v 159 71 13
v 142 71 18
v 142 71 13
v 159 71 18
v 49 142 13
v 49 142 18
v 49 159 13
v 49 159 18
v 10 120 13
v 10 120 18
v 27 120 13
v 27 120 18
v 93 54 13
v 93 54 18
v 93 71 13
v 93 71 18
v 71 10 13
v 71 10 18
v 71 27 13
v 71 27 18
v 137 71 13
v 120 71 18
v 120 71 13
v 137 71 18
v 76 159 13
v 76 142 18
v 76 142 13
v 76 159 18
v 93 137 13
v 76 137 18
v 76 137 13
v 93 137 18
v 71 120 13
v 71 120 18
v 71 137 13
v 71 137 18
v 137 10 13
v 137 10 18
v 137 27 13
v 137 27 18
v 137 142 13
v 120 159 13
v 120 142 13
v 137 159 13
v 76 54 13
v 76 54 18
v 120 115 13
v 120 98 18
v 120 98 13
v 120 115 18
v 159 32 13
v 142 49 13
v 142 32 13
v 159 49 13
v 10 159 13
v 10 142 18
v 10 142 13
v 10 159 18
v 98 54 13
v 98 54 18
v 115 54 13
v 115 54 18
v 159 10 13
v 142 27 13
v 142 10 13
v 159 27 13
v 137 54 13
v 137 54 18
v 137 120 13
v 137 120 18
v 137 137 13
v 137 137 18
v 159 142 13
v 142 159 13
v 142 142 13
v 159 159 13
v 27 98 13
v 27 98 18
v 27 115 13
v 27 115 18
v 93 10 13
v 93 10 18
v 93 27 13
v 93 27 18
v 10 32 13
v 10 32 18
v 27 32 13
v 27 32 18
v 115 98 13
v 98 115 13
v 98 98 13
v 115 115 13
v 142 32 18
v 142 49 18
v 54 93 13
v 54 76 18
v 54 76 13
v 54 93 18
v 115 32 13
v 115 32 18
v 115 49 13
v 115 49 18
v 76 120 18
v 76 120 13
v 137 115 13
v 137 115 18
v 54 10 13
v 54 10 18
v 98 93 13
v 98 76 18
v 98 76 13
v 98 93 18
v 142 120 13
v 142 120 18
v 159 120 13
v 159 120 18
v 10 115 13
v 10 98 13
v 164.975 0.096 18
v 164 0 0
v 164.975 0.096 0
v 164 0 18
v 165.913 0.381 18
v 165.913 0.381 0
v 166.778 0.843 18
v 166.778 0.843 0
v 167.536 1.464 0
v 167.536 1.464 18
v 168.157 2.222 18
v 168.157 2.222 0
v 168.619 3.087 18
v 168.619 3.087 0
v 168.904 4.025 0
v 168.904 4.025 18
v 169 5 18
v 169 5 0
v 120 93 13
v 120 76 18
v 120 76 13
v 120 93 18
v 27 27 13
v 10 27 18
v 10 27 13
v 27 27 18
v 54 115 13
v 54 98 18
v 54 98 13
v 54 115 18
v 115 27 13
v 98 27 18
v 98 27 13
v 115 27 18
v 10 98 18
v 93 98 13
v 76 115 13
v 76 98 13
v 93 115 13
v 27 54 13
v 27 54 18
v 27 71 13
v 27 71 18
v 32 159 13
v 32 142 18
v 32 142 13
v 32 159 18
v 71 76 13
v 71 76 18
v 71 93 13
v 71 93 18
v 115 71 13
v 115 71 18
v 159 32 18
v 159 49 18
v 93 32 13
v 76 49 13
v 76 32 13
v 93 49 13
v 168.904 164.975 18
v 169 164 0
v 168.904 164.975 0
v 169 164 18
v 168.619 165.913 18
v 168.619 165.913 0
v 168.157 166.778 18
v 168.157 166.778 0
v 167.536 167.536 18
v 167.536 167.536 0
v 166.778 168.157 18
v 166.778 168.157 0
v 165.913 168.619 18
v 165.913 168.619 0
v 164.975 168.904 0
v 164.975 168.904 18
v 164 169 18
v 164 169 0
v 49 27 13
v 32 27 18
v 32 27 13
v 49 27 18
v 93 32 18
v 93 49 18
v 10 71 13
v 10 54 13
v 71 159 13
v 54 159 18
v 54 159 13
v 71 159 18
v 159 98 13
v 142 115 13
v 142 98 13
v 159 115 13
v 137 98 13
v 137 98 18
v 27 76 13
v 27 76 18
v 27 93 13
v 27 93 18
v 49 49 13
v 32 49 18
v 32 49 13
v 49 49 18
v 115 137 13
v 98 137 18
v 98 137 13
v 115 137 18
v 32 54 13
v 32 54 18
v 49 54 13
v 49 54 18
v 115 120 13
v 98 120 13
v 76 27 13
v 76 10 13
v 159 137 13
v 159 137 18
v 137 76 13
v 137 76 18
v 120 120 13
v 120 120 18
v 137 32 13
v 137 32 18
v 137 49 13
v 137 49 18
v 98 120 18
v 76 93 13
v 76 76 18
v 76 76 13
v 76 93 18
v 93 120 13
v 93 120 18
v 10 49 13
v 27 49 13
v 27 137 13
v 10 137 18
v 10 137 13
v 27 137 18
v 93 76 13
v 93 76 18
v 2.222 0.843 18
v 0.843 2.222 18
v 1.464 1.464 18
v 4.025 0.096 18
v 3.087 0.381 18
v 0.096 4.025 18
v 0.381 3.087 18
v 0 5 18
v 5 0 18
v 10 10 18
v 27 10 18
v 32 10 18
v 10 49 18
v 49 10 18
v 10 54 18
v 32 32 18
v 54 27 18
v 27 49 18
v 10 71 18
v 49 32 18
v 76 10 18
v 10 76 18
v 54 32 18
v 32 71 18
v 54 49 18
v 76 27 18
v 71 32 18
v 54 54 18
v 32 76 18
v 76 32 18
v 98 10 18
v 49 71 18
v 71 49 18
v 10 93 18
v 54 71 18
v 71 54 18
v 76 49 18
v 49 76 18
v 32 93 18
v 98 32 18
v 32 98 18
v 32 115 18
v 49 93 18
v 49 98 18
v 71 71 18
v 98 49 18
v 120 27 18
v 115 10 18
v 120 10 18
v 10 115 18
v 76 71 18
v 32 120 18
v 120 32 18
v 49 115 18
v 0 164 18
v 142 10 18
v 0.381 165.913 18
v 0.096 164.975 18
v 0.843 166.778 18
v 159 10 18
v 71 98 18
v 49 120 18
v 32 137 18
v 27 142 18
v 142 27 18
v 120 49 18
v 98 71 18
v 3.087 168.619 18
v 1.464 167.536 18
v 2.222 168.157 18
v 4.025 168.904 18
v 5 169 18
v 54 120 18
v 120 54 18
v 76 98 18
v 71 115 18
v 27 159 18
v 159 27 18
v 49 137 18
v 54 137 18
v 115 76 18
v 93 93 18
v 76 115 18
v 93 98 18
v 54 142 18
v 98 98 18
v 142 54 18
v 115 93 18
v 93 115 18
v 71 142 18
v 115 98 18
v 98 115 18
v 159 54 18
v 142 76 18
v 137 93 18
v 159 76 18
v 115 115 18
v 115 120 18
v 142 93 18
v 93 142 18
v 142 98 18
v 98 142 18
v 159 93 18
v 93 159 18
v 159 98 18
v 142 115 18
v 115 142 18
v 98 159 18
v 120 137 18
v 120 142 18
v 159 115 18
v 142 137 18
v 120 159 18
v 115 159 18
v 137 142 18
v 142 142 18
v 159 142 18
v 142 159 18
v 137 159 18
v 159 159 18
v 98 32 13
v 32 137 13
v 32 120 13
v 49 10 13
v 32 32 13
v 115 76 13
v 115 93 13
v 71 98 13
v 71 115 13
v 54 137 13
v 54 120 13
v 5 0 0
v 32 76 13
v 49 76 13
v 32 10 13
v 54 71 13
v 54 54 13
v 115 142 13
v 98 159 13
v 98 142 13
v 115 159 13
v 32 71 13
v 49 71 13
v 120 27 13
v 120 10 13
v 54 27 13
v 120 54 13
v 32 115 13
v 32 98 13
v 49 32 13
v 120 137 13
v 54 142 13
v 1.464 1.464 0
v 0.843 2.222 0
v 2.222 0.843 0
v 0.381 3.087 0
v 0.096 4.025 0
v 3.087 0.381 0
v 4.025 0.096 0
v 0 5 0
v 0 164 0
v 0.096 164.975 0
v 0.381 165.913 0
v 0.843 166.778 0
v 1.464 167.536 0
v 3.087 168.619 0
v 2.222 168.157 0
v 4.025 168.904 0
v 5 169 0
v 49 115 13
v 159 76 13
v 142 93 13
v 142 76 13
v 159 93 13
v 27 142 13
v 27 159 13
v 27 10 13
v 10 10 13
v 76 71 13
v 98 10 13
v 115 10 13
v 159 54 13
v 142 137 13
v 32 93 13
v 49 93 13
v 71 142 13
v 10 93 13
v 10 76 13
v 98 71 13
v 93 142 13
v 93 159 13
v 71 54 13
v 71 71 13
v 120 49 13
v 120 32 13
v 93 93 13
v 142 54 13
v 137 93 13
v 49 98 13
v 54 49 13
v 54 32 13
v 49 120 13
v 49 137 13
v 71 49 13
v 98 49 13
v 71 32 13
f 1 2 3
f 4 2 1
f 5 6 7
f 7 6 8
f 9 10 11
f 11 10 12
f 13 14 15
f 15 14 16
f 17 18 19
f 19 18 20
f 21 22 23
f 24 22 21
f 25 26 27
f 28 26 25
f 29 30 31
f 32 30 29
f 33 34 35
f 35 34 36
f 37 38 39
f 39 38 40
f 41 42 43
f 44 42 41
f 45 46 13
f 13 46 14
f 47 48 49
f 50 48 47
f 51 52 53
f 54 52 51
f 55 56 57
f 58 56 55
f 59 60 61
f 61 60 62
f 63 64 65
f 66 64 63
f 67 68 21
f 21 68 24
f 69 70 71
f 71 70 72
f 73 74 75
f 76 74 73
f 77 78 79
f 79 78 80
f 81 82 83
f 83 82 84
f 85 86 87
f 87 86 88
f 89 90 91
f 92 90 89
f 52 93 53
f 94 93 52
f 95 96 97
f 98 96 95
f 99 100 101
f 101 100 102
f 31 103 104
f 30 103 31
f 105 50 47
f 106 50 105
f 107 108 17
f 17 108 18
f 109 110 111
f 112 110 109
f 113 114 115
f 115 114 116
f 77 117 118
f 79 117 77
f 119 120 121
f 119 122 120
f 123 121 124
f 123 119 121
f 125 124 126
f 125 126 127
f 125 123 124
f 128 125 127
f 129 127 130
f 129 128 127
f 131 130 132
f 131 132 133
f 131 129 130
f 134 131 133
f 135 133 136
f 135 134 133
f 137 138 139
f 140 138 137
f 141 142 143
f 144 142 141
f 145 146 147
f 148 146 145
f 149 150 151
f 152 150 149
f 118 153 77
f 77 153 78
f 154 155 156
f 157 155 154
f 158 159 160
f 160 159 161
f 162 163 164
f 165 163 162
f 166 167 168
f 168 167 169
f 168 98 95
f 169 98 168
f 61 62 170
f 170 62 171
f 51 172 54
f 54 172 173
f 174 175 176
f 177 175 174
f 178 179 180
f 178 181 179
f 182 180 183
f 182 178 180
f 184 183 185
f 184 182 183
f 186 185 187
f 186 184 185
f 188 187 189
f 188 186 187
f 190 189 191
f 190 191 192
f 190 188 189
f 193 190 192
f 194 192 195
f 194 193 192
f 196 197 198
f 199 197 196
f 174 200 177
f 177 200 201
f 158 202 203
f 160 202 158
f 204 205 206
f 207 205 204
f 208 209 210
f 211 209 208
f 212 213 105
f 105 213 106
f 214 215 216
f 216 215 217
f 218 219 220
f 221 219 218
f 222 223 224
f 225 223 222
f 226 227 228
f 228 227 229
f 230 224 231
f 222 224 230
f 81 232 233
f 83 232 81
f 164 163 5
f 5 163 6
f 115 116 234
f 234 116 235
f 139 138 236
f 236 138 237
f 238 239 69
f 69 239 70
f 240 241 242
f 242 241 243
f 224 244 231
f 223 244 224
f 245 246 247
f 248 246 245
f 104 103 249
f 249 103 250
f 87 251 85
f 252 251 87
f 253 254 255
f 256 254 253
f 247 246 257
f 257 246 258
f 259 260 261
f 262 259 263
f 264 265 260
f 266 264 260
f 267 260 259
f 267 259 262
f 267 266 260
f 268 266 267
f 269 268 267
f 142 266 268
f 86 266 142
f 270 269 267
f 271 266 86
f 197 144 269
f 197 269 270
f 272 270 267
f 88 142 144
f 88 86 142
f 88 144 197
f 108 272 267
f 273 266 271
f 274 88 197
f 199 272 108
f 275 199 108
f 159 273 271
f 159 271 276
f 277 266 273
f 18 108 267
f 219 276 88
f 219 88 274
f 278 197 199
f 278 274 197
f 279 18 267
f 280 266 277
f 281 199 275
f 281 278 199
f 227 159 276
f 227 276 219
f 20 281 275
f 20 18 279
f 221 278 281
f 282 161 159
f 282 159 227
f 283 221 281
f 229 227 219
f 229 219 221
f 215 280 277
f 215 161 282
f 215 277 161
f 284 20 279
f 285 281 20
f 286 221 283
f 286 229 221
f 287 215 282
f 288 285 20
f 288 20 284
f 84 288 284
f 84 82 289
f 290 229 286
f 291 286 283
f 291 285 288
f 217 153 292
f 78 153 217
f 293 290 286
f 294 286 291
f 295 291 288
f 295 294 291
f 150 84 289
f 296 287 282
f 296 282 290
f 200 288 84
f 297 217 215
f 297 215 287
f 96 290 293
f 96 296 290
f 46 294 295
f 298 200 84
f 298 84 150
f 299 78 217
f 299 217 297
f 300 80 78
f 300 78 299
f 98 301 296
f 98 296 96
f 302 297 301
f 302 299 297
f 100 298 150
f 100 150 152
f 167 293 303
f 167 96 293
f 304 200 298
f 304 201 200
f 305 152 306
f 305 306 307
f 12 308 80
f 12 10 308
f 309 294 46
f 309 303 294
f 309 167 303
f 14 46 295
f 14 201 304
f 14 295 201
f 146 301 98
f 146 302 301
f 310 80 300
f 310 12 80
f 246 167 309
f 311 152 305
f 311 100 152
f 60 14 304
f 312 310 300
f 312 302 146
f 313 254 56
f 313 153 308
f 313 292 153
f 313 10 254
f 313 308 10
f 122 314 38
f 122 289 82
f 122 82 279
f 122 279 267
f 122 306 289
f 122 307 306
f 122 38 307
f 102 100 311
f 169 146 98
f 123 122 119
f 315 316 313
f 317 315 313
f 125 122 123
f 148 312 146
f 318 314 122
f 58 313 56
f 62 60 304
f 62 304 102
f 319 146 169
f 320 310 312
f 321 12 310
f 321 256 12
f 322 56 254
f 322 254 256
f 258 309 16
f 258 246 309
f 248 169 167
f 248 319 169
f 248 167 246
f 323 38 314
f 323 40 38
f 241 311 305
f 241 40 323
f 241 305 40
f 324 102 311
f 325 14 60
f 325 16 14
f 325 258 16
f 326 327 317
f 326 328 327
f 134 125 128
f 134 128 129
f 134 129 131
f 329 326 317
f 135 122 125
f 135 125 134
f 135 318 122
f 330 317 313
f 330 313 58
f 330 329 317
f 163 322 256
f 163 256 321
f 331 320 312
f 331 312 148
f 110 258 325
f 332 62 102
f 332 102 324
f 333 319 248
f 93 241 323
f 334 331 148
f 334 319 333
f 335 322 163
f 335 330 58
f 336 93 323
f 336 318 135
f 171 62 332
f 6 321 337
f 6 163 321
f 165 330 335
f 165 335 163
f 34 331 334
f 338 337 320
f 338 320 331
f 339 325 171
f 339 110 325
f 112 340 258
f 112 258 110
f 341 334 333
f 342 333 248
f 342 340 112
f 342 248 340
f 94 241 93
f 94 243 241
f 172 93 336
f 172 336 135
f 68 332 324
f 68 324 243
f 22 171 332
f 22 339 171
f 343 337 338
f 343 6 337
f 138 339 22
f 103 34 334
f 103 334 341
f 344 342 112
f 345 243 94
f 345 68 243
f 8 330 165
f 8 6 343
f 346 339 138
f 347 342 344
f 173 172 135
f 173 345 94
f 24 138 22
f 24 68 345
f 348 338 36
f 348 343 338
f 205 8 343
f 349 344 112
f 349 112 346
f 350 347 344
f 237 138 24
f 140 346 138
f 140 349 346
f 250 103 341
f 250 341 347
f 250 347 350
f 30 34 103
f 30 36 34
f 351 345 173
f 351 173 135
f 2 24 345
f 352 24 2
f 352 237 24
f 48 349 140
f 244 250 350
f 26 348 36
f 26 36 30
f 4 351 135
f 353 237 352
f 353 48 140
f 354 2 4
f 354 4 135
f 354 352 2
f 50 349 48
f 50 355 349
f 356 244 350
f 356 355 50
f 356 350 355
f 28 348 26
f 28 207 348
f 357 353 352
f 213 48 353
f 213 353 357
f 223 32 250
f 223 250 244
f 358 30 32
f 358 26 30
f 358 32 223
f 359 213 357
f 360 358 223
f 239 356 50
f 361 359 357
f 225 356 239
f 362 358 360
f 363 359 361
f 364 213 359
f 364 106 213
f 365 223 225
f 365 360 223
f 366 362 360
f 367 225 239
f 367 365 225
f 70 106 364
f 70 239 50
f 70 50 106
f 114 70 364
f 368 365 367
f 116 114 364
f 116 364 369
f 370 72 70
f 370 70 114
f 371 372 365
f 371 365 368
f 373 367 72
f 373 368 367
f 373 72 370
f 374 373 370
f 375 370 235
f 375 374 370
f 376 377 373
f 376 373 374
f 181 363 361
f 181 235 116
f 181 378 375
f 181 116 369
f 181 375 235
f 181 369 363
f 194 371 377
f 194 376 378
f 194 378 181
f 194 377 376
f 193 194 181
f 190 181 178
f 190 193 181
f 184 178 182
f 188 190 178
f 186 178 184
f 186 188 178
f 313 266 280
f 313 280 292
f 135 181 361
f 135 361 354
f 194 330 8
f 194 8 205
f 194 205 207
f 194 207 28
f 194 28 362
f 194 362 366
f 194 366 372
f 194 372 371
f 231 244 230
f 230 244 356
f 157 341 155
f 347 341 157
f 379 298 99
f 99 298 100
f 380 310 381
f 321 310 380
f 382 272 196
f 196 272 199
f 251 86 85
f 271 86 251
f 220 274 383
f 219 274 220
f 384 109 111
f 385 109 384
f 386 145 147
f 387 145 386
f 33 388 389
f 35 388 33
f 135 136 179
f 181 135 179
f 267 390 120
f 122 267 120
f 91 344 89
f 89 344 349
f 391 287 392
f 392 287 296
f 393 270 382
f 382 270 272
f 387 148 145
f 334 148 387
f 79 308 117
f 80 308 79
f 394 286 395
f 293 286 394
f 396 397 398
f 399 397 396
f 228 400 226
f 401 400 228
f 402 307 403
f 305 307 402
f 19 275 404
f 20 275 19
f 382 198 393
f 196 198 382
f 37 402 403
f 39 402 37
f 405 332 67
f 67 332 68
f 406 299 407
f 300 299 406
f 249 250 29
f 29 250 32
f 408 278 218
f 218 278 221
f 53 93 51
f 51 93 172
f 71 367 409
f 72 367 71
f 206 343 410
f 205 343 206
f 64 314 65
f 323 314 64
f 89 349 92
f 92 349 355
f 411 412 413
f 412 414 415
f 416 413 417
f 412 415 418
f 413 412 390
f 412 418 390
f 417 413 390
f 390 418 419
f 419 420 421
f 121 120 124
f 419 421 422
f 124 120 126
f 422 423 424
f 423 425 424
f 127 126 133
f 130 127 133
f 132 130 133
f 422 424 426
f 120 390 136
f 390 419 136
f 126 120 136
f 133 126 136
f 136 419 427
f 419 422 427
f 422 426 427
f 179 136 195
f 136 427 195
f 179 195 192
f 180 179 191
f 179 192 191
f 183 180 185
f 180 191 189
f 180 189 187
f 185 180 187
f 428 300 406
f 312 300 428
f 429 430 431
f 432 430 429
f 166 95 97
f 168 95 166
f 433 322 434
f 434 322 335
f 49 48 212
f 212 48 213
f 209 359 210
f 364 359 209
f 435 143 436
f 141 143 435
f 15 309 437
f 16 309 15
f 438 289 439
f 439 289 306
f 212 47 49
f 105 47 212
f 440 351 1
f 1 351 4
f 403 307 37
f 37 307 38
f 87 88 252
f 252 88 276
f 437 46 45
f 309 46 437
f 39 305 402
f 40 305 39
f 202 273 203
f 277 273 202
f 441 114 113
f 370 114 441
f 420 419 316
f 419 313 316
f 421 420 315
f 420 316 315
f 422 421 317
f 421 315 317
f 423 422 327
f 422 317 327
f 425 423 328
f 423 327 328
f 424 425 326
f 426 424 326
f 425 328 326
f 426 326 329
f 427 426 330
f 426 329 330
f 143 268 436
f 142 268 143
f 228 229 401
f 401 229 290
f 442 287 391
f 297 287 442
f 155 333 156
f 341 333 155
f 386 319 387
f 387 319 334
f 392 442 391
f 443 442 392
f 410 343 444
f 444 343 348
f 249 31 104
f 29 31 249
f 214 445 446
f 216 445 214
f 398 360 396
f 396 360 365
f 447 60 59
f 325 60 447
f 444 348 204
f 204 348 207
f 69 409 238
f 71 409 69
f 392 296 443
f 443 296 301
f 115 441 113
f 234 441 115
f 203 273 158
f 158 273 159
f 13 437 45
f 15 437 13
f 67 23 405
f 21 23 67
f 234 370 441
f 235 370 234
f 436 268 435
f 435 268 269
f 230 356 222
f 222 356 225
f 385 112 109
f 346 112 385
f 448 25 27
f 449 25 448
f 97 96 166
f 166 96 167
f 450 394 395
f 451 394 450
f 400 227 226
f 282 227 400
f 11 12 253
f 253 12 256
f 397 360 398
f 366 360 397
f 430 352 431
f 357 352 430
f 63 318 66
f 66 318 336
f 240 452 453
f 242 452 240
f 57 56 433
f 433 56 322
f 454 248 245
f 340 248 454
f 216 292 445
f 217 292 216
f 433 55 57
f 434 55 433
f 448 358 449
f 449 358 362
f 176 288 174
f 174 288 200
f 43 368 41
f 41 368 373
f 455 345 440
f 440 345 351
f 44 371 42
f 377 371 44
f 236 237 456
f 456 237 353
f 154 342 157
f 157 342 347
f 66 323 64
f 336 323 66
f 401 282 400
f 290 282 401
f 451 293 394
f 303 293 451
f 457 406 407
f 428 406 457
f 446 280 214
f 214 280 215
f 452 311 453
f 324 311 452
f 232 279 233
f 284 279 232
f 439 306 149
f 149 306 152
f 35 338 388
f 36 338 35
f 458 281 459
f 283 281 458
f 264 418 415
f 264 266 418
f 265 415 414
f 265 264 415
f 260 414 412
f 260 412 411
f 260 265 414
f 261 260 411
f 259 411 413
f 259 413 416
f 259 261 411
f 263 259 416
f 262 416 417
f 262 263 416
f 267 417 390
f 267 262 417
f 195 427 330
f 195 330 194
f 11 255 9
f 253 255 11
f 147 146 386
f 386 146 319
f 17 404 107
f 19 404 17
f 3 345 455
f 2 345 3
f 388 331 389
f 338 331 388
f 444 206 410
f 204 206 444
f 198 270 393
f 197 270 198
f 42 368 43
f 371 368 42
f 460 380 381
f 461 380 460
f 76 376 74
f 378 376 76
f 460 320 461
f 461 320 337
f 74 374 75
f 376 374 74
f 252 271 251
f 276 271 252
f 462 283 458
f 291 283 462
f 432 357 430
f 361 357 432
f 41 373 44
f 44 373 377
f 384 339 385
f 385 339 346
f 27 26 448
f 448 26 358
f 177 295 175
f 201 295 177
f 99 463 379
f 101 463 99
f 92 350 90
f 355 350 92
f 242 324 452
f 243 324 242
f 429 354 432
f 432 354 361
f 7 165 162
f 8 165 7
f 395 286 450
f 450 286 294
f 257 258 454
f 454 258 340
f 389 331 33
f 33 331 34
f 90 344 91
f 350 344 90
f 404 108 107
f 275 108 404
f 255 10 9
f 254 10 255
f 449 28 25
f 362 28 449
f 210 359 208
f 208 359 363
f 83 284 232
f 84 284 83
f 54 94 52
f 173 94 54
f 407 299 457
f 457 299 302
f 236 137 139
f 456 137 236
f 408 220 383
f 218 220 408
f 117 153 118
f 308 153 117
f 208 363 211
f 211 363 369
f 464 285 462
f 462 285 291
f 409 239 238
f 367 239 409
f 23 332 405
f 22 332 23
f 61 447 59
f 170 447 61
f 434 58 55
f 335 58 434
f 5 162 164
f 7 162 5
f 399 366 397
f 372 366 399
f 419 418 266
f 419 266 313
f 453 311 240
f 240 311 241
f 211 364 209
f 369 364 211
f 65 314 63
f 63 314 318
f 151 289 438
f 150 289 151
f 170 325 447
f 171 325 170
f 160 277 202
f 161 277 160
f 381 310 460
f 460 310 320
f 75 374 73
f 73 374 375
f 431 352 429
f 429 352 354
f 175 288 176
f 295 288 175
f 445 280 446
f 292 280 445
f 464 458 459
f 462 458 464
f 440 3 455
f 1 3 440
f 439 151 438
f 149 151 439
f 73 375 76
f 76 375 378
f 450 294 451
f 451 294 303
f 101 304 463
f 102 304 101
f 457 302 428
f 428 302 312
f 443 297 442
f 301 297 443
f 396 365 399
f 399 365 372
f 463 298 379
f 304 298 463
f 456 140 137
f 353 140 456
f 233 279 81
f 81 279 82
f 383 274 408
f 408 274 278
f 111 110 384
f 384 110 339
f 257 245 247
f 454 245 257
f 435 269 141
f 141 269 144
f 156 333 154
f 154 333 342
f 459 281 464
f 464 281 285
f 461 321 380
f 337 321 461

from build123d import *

# Parameters (mm, degrees)
SKETCH_W                     = 169
SKETCH_H                     = 169
PAD_DEPTH                    = 18
FILLET_R                     = 5
SKETCH001_W                  = 17
SKETCH001_H                  = 17
POCKET_DEPTH                 = 5
SKETCH001_LINEARPATTERN_2_W  = 17
SKETCH001_LINEARPATTERN_2_H  = 17
POCKET_LINEARPATTERN_2_DEPTH = 5
SKETCH001_LINEARPATTERN_3_W  = 17
SKETCH001_LINEARPATTERN_3_H  = 17
POCKET_LINEARPATTERN_3_DEPTH = 5
SKETCH001_LINEARPATTERN_4_W  = 17
SKETCH001_LINEARPATTERN_4_H  = 17
POCKET_LINEARPATTERN_4_DEPTH = 5
SKETCH001_LINEARPATTERN_5_W  = 17
SKETCH001_LINEARPATTERN_5_H  = 17
POCKET_LINEARPATTERN_5_DEPTH = 5
SKETCH001_LINEARPATTERN_6_W  = 17
SKETCH001_LINEARPATTERN_6_H  = 17
POCKET_LINEARPATTERN_6_DEPTH = 5
SKETCH001_LINEARPATTERN_7_W  = 17
SKETCH001_LINEARPATTERN_7_H  = 17
POCKET_LINEARPATTERN_7_DEPTH = 5
LINEARPATTERN001_COUNT       = 7
LINEARPATTERN001_PITCH       = 22


with BuildPart() as part:
    # Sketch → Pad (new body)
    with BuildSketch(Plane.XY):
        with Locations((84.5, 84.5)):
            Rectangle(SKETCH_W, SKETCH_H)
    extrude(amount=PAD_DEPTH)

    # Fillet
    fillet_edges = [part.edges().sort_by_distance(p)[0] for p in [
        (169, 0, 9),
        (169, 169, 9),
        (0, 0, 9),
        (0, 169, 9),
    ]]
    fillet(fillet_edges, radius=FILLET_R)

    # Sketch001 (on Face5 of Fillet) → Pocket (cut)
    with BuildSketch(Plane.XY.offset(18)):
        with Locations((18.5, 18.5)):
            Rectangle(SKETCH001_W, SKETCH001_H)
    pocket = extrude(amount=-POCKET_DEPTH, mode=Mode.SUBTRACT)

    # Sketch001 LinearPattern 2 → Pocket LinearPattern 2 (cut)
    with BuildSketch(Plane(origin=(22, 0, 18), x_dir=(1, 0, 0), z_dir=(0, 0, 1))):
        with Locations((18.5, 18.5)):
            Rectangle(SKETCH001_LINEARPATTERN_2_W, SKETCH001_LINEARPATTERN_2_H)
    pocket_linearpattern_2 = extrude(amount=-POCKET_LINEARPATTERN_2_DEPTH, mode=Mode.SUBTRACT)

    # Sketch001 LinearPattern 3 → Pocket LinearPattern 3 (cut)
    with BuildSketch(Plane(origin=(44, 0, 18), x_dir=(1, 0, 0), z_dir=(0, 0, 1))):
        with Locations((18.5, 18.5)):
            Rectangle(SKETCH001_LINEARPATTERN_3_W, SKETCH001_LINEARPATTERN_3_H)
    pocket_linearpattern_3 = extrude(amount=-POCKET_LINEARPATTERN_3_DEPTH, mode=Mode.SUBTRACT)

    # Sketch001 LinearPattern 4 → Pocket LinearPattern 4 (cut)
    with BuildSketch(Plane(origin=(66, 0, 18), x_dir=(1, 0, 0), z_dir=(0, 0, 1))):
        with Locations((18.5, 18.5)):
            Rectangle(SKETCH001_LINEARPATTERN_4_W, SKETCH001_LINEARPATTERN_4_H)
    pocket_linearpattern_4 = extrude(amount=-POCKET_LINEARPATTERN_4_DEPTH, mode=Mode.SUBTRACT)

    # Sketch001 LinearPattern 5 → Pocket LinearPattern 5 (cut)
    with BuildSketch(Plane(origin=(88, 0, 18), x_dir=(1, 0, 0), z_dir=(0, 0, 1))):
        with Locations((18.5, 18.5)):
            Rectangle(SKETCH001_LINEARPATTERN_5_W, SKETCH001_LINEARPATTERN_5_H)
    pocket_linearpattern_5 = extrude(amount=-POCKET_LINEARPATTERN_5_DEPTH, mode=Mode.SUBTRACT)

    # Sketch001 LinearPattern 6 → Pocket LinearPattern 6 (cut)
    with BuildSketch(Plane(origin=(110, 0, 18), x_dir=(1, 0, 0), z_dir=(0, 0, 1))):
        with Locations((18.5, 18.5)):
            Rectangle(SKETCH001_LINEARPATTERN_6_W, SKETCH001_LINEARPATTERN_6_H)
    pocket_linearpattern_6 = extrude(amount=-POCKET_LINEARPATTERN_6_DEPTH, mode=Mode.SUBTRACT)

    # Sketch001 LinearPattern 7 → Pocket LinearPattern 7 (cut)
    with BuildSketch(Plane(origin=(132, 0, 18), x_dir=(1, 0, 0), z_dir=(0, 0, 1))):
        with Locations((18.5, 18.5)):
            Rectangle(SKETCH001_LINEARPATTERN_7_W, SKETCH001_LINEARPATTERN_7_H)
    pocket_linearpattern_7 = extrude(amount=-POCKET_LINEARPATTERN_7_DEPTH, mode=Mode.SUBTRACT)

    # LinearPattern001: Pocket, Pocket LinearPattern 2, Pocket LinearPattern 3, Pocket LinearPattern 4, Pocket LinearPattern 5, Pocket LinearPattern 6, Pocket LinearPattern 7 ×7
    with Locations(*[(0, i * LINEARPATTERN001_PITCH, 0) for i in range(1, LINEARPATTERN001_COUNT)]):
        add(pocket, mode=Mode.SUBTRACT)
        add(pocket_linearpattern_2, mode=Mode.SUBTRACT)
        add(pocket_linearpattern_3, mode=Mode.SUBTRACT)
        add(pocket_linearpattern_4, mode=Mode.SUBTRACT)
        add(pocket_linearpattern_5, mode=Mode.SUBTRACT)
        add(pocket_linearpattern_6, mode=Mode.SUBTRACT)
        add(pocket_linearpattern_7, mode=Mode.SUBTRACT)


solid = part.part
